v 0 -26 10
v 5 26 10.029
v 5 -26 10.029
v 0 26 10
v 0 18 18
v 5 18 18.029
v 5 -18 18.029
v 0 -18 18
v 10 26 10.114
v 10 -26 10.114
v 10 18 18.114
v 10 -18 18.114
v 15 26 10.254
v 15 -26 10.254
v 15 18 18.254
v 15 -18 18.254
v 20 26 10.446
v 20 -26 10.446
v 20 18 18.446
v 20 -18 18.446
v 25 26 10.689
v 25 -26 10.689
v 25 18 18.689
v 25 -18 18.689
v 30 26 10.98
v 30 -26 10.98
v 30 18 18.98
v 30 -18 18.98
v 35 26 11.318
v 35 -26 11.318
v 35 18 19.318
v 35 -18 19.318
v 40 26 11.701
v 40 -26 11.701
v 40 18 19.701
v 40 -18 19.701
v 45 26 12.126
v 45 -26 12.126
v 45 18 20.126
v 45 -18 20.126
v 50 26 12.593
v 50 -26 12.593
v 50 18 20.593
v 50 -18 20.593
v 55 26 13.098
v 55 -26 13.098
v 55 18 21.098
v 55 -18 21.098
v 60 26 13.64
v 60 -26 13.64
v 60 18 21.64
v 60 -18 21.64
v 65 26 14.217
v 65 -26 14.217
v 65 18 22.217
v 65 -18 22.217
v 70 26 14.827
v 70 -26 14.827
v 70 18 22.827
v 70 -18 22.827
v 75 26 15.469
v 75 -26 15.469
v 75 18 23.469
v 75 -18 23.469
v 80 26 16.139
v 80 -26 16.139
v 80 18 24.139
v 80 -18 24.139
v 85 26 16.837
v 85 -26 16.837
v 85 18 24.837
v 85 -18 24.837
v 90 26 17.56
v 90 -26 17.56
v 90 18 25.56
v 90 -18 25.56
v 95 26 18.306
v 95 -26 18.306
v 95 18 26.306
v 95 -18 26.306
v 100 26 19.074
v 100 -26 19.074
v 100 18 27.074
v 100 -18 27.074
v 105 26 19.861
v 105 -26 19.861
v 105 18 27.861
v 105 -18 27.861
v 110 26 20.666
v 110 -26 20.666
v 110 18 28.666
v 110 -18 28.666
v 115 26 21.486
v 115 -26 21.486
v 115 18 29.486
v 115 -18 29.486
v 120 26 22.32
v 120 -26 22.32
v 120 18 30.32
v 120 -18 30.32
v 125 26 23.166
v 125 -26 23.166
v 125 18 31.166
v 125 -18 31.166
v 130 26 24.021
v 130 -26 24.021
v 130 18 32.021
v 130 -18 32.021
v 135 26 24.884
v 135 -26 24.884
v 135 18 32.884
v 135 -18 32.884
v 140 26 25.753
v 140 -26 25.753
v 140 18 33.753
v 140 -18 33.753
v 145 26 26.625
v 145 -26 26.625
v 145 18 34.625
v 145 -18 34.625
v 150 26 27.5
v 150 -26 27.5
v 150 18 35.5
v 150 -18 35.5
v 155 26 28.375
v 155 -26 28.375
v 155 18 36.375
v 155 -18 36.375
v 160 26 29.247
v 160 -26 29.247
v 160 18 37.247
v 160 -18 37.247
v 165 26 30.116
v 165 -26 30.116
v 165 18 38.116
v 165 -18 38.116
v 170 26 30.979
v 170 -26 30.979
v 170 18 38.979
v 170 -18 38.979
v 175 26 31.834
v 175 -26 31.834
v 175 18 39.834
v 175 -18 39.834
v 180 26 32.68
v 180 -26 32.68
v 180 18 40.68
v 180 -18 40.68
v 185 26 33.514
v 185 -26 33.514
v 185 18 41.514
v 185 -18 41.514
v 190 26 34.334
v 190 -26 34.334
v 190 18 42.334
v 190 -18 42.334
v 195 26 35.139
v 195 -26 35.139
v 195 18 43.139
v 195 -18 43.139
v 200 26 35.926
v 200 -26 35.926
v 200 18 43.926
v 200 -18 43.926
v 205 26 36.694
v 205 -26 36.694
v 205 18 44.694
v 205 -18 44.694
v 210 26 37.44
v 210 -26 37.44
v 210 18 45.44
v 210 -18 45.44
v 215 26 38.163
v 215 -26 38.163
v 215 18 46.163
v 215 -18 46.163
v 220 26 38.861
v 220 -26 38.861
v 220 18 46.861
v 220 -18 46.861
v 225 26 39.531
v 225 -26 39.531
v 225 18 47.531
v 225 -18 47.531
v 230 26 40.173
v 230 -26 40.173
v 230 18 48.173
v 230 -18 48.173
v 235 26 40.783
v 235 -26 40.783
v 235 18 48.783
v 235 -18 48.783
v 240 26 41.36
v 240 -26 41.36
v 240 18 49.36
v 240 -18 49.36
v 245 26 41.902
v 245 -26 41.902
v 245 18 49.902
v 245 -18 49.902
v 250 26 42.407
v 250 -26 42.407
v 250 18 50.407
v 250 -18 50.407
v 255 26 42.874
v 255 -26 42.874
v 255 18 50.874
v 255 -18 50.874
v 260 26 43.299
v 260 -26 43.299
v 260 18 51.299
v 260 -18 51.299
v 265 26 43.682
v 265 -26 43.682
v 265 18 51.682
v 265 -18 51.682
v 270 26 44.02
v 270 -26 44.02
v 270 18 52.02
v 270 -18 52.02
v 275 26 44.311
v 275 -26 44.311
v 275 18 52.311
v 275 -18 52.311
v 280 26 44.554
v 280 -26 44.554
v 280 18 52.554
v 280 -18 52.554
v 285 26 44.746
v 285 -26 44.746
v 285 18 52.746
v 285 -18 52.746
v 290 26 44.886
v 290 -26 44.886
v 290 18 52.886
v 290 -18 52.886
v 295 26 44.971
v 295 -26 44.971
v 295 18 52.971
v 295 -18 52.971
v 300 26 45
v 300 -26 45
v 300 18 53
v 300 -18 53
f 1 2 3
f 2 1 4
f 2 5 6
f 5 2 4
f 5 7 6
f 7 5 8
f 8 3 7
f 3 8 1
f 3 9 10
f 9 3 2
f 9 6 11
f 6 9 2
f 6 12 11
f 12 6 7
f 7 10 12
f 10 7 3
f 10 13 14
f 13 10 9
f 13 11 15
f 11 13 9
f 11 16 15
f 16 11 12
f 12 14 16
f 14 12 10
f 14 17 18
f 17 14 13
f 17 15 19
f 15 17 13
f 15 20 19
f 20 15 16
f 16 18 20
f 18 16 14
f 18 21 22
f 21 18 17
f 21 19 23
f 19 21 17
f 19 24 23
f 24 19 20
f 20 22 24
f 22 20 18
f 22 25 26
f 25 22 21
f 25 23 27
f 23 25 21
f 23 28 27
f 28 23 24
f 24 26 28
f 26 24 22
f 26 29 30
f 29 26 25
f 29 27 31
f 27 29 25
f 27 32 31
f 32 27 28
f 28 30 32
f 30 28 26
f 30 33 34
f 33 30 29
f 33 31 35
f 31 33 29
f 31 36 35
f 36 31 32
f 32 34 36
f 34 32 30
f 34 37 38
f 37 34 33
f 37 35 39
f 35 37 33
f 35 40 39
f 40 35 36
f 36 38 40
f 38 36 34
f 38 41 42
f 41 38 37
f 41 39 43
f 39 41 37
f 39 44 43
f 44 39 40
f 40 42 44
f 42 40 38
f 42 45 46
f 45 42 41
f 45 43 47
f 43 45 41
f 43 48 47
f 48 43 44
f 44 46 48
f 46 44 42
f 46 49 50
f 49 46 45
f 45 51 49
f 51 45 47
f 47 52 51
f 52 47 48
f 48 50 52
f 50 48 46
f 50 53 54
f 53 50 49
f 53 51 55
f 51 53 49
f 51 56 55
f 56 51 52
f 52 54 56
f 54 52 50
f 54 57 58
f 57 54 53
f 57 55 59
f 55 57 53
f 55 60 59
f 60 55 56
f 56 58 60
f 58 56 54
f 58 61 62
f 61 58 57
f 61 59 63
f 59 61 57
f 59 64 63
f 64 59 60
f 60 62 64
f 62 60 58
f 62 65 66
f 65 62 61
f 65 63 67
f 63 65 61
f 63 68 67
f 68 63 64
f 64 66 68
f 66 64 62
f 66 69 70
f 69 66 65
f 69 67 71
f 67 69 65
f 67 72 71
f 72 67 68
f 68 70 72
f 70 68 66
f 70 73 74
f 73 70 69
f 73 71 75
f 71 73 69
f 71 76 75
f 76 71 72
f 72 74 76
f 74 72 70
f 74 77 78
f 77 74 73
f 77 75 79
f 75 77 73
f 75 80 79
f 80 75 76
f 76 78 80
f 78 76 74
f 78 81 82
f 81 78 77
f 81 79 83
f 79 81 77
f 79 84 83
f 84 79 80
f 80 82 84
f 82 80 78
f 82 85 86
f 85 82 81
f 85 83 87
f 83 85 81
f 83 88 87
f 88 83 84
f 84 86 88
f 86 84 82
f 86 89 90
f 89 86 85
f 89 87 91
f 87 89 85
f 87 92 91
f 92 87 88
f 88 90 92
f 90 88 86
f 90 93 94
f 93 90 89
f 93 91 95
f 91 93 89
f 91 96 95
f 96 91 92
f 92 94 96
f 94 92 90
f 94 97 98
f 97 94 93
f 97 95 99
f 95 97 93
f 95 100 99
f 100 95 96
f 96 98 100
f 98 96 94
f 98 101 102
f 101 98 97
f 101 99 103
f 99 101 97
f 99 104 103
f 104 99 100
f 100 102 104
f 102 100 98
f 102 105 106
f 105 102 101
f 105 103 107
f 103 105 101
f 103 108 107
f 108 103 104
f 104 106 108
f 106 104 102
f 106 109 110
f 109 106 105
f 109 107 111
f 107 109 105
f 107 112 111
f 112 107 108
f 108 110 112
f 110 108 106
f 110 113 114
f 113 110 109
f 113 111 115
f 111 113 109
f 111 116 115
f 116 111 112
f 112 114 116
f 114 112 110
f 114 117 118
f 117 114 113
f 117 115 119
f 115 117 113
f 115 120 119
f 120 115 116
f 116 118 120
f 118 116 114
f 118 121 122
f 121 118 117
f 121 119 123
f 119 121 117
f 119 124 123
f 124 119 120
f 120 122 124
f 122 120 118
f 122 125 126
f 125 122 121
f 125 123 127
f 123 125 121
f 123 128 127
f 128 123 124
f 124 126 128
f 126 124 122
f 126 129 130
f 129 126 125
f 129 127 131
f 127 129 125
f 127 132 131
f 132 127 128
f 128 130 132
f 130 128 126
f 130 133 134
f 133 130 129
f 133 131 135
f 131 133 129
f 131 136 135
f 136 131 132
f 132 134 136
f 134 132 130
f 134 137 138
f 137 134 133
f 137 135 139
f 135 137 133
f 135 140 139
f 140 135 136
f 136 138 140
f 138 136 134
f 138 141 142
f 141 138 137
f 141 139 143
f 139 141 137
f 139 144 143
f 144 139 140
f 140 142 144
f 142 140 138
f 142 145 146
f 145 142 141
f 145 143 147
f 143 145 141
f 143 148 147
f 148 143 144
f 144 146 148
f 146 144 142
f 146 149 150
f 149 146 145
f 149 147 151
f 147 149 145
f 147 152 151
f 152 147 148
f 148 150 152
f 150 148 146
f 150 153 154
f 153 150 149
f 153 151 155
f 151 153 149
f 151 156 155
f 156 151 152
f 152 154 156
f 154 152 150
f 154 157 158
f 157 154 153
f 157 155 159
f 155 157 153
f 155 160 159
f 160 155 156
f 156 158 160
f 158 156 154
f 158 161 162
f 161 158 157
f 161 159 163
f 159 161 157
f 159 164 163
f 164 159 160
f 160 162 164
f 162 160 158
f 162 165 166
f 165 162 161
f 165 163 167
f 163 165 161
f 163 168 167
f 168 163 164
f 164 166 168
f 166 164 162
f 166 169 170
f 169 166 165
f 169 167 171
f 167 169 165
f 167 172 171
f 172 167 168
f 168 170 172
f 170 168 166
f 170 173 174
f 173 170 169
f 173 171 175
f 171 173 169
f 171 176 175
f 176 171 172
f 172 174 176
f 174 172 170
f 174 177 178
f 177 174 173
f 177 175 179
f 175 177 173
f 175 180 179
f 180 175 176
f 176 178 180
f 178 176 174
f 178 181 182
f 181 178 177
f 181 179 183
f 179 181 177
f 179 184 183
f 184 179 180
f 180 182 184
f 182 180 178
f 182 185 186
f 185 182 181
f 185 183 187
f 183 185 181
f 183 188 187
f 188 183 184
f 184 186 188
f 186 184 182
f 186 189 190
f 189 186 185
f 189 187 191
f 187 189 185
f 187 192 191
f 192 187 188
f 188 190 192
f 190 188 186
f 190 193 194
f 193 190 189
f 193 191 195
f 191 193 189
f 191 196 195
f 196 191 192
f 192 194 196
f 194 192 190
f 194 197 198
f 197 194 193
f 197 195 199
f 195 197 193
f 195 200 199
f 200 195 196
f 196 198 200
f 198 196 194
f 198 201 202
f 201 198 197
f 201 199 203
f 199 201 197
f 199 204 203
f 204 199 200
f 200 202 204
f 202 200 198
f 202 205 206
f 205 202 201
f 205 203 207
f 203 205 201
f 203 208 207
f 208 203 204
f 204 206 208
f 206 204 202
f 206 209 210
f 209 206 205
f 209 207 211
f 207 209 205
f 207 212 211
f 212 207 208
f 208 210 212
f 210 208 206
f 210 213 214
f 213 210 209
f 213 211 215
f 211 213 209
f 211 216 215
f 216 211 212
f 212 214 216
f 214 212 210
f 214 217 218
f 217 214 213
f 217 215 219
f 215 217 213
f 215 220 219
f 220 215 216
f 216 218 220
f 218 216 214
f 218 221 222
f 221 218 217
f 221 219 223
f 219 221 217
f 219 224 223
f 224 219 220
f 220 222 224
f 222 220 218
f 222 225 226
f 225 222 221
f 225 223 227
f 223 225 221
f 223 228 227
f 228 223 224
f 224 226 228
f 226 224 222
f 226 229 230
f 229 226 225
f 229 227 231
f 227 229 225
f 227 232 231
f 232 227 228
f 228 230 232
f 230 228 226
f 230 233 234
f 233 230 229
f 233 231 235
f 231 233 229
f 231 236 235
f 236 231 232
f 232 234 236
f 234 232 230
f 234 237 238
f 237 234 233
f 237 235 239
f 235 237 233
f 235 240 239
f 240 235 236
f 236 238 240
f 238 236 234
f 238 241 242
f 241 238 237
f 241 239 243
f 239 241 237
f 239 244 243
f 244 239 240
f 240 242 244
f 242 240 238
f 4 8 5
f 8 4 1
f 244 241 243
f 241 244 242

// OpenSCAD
// --- Parameter ---
length      = 300.0; // Streckenlänge in mm
steps       = 60;    // Auflösung entlang der Strecke (höher = glatter)

z_start     = 10.0;  // Höhe am Eingang (mm)
z_end       = 45.0;  // Höhe am Ausgang (mm)
slope_start = 0.0;   // Steigung am Eingang (z.B. 0.03 = 3%, 0 = waagerecht)
slope_end   = 0.0;   // Steigung am Ausgang (z.B. 0.02 = 2%, 0 = waagerecht)

w_top       = 36.0;  // Breite Oberkante Gleisbett (mm)
w_bottom    = 52.0;  // Breite Unterkante Gleisbett (mm)
bed_height  = 8.0;   // Dicke des Gleisbett-Körpers (mm)

// --- Kubische Bézier-Hilfsfunktionen ---
function bezier1D(p0, p1, p2, p3, t) =
    pow(1 - t, 3) * p0 +
    3 * pow(1 - t, 2) * t * p1 +
    3 * (1 - t) * pow(t, 2) * p2 +
    pow(t, 3) * p3;

function z_profile(t, L, z0, z1, m0, m1) =
    let(
        p0 = z0,
        p1 = z0 + (m0 * L) / 3.0,
        p2 = z1 - (m1 * L) / 3.0,
        p3 = z1
    )
    bezier1D(p0, p1, p2, p3, t);

// --- 3D-Gleisbett als Polyhedron aufbauen ---
module bezier_trackbed_straight() {
    n_rings = steps + 1;

    // 4 Eckpunkte pro Querschnitt:
    // 0: hinten-links (unten), 1: hinten-rechts (unten),
    // 2: vorne-rechts (oben), 3: vorne-links (oben)
    points = [
        for (i = [0 : steps])
            let(
                t  = i / steps,
                x  = t * length,
                zb = z_profile(t, length, z_start, z_end, slope_start, slope_end),
                zt = zb + bed_height,
                hb = w_bottom / 2,
                ht = w_top / 2
            )
            each [
                [x, -hb, zb],
                [x,  hb, zb],
                [x,  ht, zt],
                [x, -ht, zt]
            ]
    ];

    // Seitenflächen entlang der Segmente
    side_faces = [
        for (i = [0 : steps - 1])
            let(a = i * 4, b = (i + 1) * 4)
            each [
                [a + 0, b + 0, b + 1, a + 1], // Boden
                [a + 1, b + 1, b + 2, a + 2], // Rechte Böschung
                [a + 2, b + 2, b + 3, a + 3], // Oberseite
                [a + 3, b + 3, b + 0, a + 0]  // Linke Böschung
            ]
    ];

    // Stirnflächen (Anfang und Ende)
    start_cap = [[0, 1, 2, 3]];
    last = steps * 4;
    end_cap   = [[last + 1, last + 0, last + 3, last + 2]];

    faces = concat(side_faces, start_cap, end_cap);

    polyhedron(points = points, faces = faces, convexity = 10);
}

bezier_trackbed_straight();
